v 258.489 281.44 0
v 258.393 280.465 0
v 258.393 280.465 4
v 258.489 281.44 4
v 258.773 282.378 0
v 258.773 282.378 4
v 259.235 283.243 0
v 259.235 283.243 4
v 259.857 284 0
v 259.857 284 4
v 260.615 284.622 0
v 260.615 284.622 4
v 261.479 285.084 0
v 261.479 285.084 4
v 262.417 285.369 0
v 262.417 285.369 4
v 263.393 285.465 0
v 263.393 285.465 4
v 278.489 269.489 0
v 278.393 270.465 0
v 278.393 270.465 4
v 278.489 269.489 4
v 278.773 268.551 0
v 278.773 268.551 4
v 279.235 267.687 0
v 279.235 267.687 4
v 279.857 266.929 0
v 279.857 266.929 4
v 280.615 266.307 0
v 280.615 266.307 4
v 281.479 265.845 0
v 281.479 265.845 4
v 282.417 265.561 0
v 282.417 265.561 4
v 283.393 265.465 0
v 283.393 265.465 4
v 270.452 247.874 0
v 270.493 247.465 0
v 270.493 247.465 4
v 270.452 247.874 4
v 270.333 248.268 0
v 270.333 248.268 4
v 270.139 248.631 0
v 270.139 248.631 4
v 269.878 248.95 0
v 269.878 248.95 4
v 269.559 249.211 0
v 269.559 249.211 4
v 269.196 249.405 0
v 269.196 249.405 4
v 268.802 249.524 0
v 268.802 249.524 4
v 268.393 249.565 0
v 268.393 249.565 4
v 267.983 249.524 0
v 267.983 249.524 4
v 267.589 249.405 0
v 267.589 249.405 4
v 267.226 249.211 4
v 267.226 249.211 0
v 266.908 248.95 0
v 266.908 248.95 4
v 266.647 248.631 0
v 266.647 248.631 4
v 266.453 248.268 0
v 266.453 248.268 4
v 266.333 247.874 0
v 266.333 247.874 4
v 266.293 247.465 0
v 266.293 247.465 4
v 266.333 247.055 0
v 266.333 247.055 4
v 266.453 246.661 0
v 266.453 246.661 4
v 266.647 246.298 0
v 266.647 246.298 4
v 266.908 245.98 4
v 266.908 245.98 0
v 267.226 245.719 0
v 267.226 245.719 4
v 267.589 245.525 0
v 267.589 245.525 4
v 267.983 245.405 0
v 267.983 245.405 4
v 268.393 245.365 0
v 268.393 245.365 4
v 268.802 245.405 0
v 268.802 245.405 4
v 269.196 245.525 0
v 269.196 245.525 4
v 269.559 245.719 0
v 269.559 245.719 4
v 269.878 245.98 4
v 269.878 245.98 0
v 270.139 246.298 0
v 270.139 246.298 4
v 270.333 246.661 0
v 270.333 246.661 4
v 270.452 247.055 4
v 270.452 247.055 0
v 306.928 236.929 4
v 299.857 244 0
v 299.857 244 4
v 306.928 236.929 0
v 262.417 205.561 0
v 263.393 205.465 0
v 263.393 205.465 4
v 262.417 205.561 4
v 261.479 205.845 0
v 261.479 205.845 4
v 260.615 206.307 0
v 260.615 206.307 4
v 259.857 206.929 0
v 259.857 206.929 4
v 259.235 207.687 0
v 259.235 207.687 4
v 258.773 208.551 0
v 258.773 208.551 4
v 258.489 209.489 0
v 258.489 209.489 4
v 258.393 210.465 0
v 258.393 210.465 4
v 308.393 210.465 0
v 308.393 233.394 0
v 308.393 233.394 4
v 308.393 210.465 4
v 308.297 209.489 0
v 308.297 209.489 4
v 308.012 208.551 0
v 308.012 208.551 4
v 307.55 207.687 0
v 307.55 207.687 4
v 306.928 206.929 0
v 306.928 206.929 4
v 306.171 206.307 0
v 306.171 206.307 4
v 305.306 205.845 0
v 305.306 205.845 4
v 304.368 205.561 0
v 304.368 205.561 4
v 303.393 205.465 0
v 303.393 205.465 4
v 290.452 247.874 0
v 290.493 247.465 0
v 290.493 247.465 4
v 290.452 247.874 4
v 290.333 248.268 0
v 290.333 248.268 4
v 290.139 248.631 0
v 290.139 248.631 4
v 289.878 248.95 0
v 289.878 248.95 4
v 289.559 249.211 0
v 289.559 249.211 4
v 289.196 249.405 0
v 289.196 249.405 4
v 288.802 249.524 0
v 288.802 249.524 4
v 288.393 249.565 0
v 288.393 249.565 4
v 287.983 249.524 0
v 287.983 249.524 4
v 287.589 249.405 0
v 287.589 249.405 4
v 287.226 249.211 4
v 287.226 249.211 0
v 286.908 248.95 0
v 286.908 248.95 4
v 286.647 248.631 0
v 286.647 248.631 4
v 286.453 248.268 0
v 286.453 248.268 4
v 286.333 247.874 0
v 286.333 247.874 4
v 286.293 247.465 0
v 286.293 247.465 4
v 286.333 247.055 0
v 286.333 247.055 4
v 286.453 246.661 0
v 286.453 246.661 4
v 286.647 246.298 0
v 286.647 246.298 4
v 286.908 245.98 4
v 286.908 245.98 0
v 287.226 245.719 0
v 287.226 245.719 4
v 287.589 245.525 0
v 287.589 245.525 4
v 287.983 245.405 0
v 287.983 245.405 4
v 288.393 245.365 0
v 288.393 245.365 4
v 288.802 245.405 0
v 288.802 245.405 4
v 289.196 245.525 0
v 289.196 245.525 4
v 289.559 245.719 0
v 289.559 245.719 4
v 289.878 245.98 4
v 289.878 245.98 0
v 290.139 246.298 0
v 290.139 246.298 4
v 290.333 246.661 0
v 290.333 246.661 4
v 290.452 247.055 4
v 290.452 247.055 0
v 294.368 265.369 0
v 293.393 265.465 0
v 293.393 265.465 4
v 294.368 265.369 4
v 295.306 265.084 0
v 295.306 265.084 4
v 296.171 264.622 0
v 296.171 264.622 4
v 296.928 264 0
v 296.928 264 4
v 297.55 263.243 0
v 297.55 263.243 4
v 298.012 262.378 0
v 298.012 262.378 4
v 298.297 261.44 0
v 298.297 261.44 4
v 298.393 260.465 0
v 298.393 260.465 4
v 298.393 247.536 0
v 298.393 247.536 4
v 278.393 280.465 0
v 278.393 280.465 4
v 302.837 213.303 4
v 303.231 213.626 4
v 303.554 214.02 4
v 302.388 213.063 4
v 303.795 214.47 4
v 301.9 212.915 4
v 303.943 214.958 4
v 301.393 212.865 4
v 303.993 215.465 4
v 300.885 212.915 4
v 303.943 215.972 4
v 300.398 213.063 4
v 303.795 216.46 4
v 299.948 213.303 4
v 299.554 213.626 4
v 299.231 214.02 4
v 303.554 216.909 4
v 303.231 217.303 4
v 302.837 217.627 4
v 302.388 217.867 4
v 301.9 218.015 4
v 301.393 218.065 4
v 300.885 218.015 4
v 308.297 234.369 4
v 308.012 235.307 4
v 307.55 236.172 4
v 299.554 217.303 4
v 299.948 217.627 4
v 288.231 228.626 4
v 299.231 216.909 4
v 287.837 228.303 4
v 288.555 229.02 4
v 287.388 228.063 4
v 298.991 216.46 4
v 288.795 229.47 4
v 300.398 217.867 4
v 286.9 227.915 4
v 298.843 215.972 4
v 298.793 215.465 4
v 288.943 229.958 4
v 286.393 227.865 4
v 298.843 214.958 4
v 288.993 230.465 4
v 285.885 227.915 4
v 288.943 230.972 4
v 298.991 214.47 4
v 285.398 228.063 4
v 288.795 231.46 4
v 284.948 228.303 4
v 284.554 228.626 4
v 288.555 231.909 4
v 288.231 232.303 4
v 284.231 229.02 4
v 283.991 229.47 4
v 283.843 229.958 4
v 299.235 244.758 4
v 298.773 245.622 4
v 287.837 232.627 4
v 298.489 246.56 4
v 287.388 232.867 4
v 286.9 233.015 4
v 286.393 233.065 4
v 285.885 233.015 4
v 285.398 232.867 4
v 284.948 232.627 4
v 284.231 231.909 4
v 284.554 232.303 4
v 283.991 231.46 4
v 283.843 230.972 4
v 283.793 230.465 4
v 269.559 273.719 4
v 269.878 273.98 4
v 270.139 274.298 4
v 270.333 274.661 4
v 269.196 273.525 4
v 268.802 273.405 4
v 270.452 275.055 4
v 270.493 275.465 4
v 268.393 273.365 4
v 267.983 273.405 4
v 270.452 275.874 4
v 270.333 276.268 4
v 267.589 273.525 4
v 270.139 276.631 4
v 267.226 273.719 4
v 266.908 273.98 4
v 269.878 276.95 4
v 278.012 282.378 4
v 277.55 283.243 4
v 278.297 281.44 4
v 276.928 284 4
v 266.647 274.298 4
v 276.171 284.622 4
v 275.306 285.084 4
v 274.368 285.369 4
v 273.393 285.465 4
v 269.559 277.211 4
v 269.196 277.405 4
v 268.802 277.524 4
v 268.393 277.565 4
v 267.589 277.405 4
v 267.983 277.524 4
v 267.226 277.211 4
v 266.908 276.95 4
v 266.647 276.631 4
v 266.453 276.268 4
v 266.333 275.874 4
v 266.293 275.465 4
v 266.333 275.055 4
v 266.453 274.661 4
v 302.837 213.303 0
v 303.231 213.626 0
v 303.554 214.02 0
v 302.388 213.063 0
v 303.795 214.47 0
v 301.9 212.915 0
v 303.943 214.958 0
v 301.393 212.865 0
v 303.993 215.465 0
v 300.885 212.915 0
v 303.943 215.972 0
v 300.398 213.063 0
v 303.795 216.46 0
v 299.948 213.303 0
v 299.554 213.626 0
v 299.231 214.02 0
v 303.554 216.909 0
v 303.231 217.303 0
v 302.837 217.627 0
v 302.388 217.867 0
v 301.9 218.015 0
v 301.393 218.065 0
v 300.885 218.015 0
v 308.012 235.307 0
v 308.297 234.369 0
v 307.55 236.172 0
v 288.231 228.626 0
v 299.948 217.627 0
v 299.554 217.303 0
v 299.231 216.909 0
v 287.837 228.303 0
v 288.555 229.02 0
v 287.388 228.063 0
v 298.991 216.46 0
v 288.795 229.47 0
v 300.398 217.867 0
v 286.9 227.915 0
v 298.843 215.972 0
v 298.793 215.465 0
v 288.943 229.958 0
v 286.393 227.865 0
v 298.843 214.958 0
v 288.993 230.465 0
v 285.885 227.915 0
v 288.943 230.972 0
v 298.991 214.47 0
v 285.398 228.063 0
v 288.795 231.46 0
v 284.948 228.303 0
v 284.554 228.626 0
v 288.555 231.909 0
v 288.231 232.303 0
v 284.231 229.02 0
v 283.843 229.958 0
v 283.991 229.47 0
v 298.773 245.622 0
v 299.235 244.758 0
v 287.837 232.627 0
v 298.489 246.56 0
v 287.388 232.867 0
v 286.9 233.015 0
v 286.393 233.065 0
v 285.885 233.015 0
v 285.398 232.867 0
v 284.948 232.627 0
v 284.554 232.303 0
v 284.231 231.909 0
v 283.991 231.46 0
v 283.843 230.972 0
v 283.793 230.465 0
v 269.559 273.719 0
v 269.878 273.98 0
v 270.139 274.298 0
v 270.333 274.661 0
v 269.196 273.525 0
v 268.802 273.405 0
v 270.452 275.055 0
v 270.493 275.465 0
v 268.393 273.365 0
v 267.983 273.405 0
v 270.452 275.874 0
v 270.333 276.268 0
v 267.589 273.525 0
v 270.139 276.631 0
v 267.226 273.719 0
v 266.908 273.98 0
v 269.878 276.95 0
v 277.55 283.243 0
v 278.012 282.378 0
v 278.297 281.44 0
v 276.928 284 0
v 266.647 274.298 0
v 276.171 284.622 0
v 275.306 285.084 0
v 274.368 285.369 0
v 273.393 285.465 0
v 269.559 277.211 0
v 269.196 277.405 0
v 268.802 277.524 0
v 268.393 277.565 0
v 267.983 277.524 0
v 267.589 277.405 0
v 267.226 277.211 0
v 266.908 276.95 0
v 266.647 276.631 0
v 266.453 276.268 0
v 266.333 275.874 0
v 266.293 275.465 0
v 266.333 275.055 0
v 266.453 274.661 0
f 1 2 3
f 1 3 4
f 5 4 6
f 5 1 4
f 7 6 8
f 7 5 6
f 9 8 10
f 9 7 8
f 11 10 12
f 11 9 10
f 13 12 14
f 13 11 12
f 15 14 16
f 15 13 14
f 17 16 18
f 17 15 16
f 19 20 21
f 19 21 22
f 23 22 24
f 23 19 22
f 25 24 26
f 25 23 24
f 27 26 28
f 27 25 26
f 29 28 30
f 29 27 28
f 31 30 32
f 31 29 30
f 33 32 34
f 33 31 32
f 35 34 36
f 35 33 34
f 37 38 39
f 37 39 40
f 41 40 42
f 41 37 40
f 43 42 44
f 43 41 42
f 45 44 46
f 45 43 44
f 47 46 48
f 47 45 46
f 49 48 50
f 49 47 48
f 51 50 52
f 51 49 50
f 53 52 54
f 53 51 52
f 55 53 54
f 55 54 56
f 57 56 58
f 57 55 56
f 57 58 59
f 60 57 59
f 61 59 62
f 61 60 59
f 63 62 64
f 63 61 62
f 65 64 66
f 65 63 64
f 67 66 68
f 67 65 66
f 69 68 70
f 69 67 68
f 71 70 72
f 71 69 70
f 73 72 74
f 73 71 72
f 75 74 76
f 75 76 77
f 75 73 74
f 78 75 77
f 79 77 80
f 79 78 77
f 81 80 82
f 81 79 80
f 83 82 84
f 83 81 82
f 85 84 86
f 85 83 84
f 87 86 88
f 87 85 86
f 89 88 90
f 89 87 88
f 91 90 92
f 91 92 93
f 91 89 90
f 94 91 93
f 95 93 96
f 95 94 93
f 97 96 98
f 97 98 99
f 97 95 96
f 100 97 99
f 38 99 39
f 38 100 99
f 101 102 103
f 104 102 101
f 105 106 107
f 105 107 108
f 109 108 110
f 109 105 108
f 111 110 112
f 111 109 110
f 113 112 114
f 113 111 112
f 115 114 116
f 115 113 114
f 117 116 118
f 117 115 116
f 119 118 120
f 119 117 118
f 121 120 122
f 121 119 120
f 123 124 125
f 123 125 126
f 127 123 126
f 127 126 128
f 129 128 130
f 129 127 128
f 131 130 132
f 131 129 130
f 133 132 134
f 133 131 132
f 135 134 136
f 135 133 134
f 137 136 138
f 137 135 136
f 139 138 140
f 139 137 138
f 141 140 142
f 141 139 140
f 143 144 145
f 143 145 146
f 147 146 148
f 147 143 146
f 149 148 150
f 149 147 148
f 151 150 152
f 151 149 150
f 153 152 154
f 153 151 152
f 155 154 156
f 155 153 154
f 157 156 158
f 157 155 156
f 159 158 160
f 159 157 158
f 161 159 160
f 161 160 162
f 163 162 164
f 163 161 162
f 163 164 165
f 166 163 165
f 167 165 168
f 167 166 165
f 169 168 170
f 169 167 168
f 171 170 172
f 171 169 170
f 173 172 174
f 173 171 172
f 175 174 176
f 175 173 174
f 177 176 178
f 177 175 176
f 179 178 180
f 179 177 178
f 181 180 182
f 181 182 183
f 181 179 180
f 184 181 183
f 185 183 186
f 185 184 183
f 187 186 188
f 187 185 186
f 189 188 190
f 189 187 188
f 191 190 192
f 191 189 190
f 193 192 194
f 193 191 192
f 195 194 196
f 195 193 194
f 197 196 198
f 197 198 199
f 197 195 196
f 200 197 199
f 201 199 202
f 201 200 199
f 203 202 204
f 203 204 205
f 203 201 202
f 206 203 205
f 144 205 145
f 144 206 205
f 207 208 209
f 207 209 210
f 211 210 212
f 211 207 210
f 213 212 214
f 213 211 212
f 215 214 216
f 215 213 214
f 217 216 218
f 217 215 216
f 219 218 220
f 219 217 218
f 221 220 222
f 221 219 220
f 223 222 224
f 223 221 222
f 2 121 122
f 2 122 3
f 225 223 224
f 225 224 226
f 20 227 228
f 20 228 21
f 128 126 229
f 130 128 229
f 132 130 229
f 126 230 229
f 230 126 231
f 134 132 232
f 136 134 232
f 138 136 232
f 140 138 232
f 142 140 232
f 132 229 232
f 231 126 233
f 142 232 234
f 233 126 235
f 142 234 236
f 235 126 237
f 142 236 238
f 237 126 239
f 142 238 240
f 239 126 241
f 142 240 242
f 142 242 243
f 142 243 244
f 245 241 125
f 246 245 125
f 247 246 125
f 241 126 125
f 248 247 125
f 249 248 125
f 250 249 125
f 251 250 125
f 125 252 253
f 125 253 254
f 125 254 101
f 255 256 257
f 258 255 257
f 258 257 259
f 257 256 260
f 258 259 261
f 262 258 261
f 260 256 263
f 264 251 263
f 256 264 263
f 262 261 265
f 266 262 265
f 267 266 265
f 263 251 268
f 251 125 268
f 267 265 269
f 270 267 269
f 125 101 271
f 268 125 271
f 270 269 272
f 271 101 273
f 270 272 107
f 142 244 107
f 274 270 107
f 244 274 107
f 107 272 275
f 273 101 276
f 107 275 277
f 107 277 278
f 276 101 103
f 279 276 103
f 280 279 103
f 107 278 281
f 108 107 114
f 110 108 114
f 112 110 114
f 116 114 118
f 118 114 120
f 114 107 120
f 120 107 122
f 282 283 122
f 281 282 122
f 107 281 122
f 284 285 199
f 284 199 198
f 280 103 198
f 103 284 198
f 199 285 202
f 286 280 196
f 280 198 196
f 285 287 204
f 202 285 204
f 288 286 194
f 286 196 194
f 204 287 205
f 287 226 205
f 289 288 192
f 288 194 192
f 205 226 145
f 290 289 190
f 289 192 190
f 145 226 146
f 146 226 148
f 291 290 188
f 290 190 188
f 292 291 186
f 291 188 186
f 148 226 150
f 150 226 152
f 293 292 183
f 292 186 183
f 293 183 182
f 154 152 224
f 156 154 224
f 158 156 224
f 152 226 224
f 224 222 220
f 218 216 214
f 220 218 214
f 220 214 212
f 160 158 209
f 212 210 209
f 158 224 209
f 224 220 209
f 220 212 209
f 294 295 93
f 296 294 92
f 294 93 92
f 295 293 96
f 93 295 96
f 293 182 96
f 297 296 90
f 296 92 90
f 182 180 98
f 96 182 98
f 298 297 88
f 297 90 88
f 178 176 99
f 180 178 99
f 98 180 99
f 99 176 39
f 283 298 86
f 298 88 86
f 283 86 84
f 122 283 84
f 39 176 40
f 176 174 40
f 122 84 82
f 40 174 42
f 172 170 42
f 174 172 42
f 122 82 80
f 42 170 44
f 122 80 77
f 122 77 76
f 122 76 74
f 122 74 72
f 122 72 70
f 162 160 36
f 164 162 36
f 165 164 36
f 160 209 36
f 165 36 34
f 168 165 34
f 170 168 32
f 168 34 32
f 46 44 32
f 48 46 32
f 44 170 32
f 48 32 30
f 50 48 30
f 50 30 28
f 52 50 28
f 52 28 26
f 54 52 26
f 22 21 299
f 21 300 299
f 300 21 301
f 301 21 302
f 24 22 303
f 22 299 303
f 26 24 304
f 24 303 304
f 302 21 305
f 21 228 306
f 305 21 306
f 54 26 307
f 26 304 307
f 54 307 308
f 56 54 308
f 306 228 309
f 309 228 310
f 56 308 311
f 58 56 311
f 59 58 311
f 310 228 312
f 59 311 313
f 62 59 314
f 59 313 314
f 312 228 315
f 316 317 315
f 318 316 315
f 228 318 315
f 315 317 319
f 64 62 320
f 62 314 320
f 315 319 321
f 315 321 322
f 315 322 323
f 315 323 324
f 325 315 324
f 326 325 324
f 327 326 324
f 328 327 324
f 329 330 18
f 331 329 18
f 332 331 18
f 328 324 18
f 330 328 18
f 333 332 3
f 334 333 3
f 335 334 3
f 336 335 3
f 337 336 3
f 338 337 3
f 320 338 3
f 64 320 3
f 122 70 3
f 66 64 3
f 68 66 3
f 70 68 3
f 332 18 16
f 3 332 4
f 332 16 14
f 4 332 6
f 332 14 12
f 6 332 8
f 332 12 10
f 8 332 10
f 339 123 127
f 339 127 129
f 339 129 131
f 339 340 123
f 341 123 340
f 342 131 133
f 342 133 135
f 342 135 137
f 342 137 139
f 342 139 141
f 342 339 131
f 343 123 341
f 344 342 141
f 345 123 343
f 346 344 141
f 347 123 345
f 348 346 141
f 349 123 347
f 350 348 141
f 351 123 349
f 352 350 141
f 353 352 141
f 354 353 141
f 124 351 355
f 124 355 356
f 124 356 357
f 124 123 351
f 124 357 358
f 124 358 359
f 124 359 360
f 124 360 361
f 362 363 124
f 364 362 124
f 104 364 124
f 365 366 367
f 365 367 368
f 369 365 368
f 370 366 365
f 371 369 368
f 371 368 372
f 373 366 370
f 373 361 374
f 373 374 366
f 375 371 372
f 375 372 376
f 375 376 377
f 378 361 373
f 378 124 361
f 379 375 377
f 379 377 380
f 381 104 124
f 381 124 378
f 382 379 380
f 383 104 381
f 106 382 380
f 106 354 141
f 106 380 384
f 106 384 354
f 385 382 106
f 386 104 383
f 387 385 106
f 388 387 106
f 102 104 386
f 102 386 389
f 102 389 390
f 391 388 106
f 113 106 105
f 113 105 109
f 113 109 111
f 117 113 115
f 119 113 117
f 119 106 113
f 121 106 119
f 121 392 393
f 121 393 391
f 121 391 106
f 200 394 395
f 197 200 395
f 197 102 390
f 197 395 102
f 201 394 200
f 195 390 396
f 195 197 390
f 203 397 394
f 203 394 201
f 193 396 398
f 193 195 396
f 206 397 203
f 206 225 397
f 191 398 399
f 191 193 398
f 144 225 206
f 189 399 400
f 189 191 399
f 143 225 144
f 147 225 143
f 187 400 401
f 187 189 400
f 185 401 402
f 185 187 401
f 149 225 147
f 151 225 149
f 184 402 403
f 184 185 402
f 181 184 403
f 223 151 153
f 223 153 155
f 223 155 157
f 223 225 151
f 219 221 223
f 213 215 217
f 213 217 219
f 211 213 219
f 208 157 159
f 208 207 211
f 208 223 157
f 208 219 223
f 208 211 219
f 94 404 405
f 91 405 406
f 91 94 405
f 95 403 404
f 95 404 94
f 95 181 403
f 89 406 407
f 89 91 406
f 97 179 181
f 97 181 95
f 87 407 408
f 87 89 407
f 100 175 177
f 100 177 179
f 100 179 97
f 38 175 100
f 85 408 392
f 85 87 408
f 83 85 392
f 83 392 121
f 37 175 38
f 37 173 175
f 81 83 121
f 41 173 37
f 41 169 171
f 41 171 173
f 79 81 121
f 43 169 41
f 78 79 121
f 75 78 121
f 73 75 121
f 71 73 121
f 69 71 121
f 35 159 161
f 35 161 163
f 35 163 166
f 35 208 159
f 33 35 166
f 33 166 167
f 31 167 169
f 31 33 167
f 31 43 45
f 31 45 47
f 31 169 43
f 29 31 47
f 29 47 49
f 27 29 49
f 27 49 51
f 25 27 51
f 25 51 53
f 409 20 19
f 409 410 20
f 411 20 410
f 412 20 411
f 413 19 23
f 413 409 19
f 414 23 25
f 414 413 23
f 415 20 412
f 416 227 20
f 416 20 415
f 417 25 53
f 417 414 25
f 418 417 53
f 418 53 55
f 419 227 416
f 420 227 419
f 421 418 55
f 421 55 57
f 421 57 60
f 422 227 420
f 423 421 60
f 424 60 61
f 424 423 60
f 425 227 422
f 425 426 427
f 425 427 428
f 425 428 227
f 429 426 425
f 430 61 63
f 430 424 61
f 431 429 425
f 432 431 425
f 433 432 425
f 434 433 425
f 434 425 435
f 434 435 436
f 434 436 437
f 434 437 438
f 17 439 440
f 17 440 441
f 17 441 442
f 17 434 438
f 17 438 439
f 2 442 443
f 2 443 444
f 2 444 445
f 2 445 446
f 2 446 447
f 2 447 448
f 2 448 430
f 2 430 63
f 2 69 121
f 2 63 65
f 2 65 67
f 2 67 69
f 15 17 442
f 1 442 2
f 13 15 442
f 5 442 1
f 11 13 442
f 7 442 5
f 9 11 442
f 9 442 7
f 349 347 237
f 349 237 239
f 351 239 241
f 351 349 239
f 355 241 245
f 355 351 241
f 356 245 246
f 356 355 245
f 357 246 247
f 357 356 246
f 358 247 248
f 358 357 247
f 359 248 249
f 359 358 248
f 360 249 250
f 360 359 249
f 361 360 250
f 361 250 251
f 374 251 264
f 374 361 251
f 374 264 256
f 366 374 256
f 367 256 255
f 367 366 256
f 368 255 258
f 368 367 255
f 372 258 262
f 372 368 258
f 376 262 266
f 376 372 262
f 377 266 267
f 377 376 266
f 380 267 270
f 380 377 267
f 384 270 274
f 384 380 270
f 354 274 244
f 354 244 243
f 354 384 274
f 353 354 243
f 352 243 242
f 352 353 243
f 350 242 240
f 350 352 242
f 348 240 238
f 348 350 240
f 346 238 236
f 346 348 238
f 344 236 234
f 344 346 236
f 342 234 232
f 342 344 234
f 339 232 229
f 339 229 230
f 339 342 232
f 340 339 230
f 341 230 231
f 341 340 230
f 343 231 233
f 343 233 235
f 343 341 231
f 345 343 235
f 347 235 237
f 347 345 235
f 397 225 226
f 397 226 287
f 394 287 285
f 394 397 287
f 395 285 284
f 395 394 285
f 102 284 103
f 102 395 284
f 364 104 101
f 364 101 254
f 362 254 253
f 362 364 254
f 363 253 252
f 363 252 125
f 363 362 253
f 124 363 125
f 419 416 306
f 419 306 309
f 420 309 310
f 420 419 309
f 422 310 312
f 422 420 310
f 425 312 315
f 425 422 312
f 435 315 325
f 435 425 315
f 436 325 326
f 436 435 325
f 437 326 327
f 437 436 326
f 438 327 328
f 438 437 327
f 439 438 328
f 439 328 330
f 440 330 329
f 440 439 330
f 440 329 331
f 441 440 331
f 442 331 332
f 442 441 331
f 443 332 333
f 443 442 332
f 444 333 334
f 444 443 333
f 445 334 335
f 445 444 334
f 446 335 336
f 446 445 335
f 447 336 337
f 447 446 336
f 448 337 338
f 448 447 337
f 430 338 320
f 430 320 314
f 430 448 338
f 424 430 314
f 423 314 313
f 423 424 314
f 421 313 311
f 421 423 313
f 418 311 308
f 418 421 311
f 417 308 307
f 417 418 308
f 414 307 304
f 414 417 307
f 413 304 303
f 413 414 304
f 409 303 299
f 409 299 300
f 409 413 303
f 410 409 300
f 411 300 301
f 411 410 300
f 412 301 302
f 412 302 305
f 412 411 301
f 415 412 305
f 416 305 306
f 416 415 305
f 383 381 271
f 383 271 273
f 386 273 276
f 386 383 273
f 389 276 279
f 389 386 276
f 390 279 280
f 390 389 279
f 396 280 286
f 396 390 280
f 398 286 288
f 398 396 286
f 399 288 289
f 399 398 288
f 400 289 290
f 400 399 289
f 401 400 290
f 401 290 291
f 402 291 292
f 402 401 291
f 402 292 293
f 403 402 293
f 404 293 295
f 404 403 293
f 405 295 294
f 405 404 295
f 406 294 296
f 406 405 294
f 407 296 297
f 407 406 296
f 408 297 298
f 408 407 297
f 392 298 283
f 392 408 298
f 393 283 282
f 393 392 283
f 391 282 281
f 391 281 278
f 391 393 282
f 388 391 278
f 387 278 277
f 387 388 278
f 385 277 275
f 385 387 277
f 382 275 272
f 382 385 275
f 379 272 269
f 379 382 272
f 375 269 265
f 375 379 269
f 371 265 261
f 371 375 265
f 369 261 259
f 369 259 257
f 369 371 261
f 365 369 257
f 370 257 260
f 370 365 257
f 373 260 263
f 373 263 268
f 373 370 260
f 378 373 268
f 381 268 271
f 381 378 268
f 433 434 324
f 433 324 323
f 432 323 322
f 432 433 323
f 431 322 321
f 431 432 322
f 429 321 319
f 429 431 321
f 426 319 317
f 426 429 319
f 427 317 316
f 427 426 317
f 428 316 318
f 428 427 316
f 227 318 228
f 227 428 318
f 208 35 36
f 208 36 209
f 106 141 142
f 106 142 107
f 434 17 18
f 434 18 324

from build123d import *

# Parameters (mm, degrees)
MODEL_R         = 2.5999948
MODEL_R_2       = 2.0999958
EXTRUDE_1_DEPTH = 4


with BuildPart() as part:
    # Model → Бобышка-Вытянуть1 (new body)
    with BuildSketch(Plane.XY):
        with BuildLine():
            Line((308.392658055, 233.393719024), (308.392658055, 210.464832693))
            ThreePointArc((308.392658055, 210.464832693), (306.92819489, 206.929305859), (303.392668055, 205.464842693))
            Line((303.392668055, 205.464842693), (263.392748055, 205.464842693))
            ThreePointArc((263.392748055, 205.464842693), (259.85722122, 206.929305859), (258.392758055, 210.464832693))
            Line((258.392758055, 210.464832693), (258.392758055, 280.464692693))
            ThreePointArc((258.392758055, 280.464692693), (259.85722122, 284.000219528), (263.392748055, 285.464682693))
            Line((263.392748055, 285.464682693), (273.392728055, 285.464682693))
            ThreePointArc((273.392728055, 285.464682693), (276.92825489, 284.000219528), (278.392718055, 280.464692693))
            Line((278.392718055, 280.464692693), (278.392718055, 270.464712693))
            ThreePointArc((278.392718055, 270.464712693), (279.85718122, 266.929185859), (283.392708055, 265.464722693))
            Line((283.392708055, 265.464722693), (293.392688055, 265.464722693))
            ThreePointArc((293.392688055, 265.464722693), (296.92821489, 264.000259528), (298.392678055, 260.464732693))
            Line((298.392678055, 260.464732693), (298.392678055, 247.535826363))
            ThreePointArc((298.392678055, 247.535826363), (298.773279631, 245.622413028), (299.85714122, 244.000299528))
            Line((299.85714122, 244.000299528), (306.92819489, 236.929245859))
            ThreePointArc((306.92819489, 236.929245859), (308.012056479, 235.307132359), (308.392658055, 233.393719024))
        make_face()
        with Locations((286.392702055, 230.464792693)):
            Circle(MODEL_R, mode=Mode.SUBTRACT)
        with Locations((301.392672055, 215.464822693)):
            Circle(MODEL_R, mode=Mode.SUBTRACT)
        with Locations((268.392738055, 275.464702693)):
            Circle(MODEL_R_2, mode=Mode.SUBTRACT)
        with Locations((268.392738055, 247.464758693)):
            Circle(MODEL_R_2, mode=Mode.SUBTRACT)
        with Locations((288.392698055, 247.464758693)):
            Circle(MODEL_R_2, mode=Mode.SUBTRACT)
    extrude(amount=EXTRUDE_1_DEPTH)


solid = part.part
